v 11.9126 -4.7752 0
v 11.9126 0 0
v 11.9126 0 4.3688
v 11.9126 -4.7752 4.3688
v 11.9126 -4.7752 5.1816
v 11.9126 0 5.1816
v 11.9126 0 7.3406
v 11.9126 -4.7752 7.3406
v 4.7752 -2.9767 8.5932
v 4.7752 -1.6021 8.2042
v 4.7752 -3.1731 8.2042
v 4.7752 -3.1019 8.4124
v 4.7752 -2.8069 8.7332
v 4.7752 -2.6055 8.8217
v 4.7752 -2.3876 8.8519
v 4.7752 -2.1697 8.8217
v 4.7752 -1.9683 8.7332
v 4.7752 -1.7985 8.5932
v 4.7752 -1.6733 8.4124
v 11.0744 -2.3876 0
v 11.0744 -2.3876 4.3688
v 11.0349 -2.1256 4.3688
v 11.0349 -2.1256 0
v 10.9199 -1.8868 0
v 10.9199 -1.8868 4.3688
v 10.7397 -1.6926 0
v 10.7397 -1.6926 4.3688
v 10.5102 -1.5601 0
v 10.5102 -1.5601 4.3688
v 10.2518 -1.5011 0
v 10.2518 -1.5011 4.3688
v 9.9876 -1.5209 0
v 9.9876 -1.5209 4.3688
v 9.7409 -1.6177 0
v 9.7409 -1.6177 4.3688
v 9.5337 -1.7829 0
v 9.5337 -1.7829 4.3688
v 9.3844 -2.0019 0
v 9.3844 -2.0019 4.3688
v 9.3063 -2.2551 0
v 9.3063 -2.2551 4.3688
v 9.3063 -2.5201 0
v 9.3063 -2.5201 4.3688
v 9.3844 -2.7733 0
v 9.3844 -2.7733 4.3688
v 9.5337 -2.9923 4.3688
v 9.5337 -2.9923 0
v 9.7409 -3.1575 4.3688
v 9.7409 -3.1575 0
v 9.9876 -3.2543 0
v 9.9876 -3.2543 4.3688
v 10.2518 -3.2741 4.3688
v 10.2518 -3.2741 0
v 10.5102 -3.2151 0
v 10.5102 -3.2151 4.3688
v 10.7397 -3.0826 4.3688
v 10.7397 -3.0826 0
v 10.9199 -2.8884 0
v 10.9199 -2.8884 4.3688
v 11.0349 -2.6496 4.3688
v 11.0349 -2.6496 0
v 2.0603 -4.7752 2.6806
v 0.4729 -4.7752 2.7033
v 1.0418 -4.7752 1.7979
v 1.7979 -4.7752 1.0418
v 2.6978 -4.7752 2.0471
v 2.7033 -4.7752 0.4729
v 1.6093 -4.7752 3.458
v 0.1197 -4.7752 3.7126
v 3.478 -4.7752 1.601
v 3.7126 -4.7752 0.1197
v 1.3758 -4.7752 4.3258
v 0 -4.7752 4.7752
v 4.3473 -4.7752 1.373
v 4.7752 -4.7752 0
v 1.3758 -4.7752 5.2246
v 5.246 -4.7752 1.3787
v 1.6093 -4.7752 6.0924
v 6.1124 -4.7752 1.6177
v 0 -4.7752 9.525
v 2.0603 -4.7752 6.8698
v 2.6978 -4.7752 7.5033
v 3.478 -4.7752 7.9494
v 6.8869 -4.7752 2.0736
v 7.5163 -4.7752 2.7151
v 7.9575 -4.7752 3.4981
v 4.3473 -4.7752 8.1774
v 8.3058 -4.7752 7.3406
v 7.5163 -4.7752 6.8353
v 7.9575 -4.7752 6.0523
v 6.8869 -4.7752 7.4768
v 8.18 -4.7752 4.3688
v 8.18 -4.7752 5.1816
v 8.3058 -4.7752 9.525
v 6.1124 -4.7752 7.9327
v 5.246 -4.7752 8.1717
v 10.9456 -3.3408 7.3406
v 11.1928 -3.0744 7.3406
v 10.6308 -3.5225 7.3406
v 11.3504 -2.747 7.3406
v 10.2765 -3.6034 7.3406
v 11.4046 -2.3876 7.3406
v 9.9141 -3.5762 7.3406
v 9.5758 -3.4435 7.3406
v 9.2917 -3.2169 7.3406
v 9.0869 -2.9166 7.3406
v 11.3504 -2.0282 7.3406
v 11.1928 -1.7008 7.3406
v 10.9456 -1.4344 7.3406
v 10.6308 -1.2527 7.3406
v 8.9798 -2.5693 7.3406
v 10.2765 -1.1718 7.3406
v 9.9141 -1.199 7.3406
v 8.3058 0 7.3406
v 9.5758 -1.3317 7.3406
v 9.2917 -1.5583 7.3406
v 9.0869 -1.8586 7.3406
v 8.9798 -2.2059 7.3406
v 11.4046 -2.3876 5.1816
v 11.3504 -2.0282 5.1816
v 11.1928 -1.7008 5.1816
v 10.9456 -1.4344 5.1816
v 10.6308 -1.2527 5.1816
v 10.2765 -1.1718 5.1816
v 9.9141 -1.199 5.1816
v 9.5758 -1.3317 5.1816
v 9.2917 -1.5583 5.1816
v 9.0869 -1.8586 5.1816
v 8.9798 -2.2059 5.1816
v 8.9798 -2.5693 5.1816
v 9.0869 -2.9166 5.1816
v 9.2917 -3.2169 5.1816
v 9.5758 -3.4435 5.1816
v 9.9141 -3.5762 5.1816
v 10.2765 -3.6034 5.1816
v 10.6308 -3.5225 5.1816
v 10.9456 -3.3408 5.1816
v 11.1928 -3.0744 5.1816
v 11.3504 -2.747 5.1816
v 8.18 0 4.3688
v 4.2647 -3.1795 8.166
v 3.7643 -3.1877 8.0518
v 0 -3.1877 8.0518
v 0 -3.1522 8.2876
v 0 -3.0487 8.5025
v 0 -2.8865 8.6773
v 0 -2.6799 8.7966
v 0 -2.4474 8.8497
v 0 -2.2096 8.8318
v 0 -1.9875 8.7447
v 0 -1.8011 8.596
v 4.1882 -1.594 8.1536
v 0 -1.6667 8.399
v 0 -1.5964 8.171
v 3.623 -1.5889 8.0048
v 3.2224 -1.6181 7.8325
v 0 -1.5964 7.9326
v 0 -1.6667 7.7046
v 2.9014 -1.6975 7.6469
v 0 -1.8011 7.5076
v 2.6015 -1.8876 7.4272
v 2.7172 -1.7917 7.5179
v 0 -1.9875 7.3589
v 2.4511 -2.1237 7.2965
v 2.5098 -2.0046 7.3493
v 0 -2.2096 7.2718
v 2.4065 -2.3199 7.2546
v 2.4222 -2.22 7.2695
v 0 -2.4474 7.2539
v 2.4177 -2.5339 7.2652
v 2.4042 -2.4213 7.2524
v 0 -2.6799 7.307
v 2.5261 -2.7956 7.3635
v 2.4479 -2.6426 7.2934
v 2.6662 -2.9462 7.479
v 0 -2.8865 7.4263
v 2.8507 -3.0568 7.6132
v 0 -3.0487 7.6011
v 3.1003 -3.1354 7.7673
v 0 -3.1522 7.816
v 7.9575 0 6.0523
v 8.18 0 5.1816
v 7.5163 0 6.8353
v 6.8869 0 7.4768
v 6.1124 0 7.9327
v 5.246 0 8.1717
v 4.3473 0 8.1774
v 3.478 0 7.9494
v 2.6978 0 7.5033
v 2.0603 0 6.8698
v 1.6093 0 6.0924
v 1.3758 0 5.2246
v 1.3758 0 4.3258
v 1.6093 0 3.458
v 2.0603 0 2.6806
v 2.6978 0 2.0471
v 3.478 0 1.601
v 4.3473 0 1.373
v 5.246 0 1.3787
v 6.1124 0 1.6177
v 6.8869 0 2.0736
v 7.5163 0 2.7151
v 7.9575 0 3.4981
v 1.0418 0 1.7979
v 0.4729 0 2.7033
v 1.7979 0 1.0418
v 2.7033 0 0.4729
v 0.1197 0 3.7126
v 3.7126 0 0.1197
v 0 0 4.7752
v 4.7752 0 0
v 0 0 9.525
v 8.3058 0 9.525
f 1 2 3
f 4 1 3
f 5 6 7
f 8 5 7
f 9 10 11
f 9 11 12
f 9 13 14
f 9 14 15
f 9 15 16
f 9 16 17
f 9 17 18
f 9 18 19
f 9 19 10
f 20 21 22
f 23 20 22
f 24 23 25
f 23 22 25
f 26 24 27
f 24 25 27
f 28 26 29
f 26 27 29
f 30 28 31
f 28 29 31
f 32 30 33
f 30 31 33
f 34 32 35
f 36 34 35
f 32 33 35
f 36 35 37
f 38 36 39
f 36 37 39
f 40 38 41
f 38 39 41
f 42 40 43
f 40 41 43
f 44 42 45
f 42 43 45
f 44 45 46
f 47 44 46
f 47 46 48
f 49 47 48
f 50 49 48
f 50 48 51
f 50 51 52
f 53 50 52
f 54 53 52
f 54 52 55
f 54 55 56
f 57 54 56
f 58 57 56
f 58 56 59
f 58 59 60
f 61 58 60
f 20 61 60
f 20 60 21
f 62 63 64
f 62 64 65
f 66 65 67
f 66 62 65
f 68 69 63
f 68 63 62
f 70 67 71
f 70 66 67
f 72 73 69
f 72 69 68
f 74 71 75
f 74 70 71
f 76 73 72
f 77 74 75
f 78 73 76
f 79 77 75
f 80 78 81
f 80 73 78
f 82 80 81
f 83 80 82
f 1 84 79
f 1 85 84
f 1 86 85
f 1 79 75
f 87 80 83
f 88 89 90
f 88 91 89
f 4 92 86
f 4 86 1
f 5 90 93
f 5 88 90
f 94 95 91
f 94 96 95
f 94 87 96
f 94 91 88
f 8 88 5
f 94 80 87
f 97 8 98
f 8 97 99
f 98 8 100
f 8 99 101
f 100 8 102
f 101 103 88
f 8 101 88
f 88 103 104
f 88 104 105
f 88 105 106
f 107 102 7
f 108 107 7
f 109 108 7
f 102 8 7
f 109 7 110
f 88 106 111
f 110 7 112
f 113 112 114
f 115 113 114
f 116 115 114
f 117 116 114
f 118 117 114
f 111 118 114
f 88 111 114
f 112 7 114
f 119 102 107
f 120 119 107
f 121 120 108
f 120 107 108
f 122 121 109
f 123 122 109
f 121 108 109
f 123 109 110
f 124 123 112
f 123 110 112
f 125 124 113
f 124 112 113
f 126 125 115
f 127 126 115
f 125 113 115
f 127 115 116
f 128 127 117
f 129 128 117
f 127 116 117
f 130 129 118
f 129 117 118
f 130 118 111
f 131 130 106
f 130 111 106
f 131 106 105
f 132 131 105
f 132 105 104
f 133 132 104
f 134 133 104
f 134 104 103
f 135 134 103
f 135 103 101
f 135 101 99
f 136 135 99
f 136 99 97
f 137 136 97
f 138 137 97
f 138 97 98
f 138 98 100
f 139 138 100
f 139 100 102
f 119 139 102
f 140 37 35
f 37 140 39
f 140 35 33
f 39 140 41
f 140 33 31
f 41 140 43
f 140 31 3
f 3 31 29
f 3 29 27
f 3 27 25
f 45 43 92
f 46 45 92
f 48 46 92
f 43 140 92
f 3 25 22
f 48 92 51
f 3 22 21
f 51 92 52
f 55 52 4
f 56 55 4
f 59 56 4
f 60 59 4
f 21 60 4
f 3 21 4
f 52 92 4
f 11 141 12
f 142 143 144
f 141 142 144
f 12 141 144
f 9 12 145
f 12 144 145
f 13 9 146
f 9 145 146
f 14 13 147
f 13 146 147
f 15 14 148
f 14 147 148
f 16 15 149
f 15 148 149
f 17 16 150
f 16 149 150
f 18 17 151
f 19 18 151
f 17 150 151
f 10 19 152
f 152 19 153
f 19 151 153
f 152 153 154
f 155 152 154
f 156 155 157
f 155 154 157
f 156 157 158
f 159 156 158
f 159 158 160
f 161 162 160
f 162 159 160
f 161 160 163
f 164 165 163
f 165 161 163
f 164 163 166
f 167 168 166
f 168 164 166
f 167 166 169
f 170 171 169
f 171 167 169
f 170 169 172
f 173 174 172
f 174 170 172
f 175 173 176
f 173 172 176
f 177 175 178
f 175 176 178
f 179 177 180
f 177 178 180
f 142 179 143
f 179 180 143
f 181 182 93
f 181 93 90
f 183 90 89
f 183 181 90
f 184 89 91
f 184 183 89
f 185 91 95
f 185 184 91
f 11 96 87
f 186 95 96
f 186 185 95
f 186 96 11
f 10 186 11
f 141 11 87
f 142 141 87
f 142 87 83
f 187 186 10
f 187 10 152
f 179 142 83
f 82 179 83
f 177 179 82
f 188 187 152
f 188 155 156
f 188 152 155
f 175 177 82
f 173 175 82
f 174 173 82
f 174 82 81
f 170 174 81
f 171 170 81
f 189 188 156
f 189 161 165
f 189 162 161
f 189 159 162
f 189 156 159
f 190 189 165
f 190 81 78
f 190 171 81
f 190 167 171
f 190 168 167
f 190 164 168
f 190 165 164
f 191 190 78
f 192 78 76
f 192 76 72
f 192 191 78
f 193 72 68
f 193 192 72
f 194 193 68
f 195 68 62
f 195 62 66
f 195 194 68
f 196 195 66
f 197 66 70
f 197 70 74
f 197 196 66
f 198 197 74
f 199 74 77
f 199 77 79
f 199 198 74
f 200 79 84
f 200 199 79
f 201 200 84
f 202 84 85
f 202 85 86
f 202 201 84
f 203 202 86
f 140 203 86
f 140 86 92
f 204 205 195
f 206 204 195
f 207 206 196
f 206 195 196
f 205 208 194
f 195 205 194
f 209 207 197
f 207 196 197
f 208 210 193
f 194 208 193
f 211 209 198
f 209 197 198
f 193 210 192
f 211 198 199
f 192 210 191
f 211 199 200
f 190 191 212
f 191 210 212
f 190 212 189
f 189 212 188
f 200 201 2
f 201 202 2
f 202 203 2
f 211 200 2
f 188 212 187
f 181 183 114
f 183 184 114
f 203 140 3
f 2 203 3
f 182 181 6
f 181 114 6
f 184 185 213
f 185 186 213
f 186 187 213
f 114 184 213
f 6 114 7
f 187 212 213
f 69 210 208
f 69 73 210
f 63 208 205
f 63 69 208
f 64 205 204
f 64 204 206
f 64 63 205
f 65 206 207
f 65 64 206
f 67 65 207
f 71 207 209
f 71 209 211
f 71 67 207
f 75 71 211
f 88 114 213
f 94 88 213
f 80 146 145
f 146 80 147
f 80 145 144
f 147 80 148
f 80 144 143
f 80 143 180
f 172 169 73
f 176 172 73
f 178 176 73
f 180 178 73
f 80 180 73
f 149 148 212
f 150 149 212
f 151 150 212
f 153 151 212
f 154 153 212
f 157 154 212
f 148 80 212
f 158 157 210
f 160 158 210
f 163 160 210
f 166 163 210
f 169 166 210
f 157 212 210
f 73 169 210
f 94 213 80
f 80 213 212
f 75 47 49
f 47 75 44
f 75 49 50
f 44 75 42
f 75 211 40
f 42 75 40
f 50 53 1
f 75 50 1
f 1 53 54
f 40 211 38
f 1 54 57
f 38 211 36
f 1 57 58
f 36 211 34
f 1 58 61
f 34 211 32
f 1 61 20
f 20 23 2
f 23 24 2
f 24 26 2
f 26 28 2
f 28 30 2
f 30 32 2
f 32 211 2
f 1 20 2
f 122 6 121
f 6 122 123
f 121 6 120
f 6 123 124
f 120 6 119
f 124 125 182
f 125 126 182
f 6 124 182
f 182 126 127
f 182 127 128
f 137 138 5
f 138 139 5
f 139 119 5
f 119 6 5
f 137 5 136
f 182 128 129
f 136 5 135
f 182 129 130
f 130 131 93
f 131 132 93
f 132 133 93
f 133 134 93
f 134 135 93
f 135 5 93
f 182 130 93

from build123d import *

# Parameters (mm, degrees)
F0_R     = 3.429
F1_DEPTH = 4.7752
F3_DEPTH = 4.7762
F4_R     = 0.889
F5_DEPTH = 7.3416
F6_R     = 1.2192
F6_R_2   = 0.889
F7_DEPTH = 2.5908
F8_R     = 0.8001
F9_DEPTH = 4.7752
F10_R    = 4.7752


with BuildPart() as f1:
    # F0 (on Front) → F1 (new body)
    with BuildSketch(Plane.XZ):
        Polygon((0, 9.525), (0, 0), (11.9126, 0), (11.9126, 7.3406), (8.3058, 7.3406), (8.3058, 9.525), align=None)
        with Locations((4.7752, 4.7752)):
            Circle(F0_R, mode=Mode.SUBTRACT)
    extrude(amount=F1_DEPTH)

    # F2 (on face) → F3 (cut, through all)
    with BuildSketch(Plane.XZ.offset(4.7752)):
        with BuildLine():
            Line((11.9126, 5.1816), (8.1800318666, 5.1816))
            ThreePointArc((8.1800318666, 5.1816), (8.1981526341, 4.9787589955), (8.2042, 4.7752))
            ThreePointArc((8.2042, 4.7752), (8.1981526341, 4.5716410045), (8.1800318666, 4.3688))
            Line((8.1800318666, 4.3688), (11.9126, 4.3688))
            Line((11.9126, 4.3688), (11.9126, 5.1816))
        make_face()
    extrude(amount=-F3_DEPTH, mode=Mode.SUBTRACT)

    # F4 (on face) → F5 (cut, through all)
    with BuildSketch(Plane.XY.offset(7.3406)):
        with Locations((10.1854, -2.3876)):
            Circle(F4_R)
    extrude(amount=-F5_DEPTH, mode=Mode.SUBTRACT)

    # F6 (on face) → F7 (cut)
    with BuildSketch(Plane.XY.offset(7.3406)):
        with Locations((10.1854, -2.3876)):
            Circle(F6_R)
        with Locations((10.1854, -2.3876)):
            Circle(F6_R_2, mode=Mode.SUBTRACT)
    extrude(amount=-F7_DEPTH, mode=Mode.SUBTRACT)

    # F8 (on face) → F9 (cut)
    with BuildSketch(Plane(origin=(0, 0, 0), x_dir=(0, -1, 0), z_dir=(-1, 0, 0))):
        with Locations((2.3876, 8.0518)):
            Circle(F8_R)
    extrude(amount=-F9_DEPTH, mode=Mode.SUBTRACT)

    # F10
    f10_edges = [f1.edges().sort_by_distance(p)[0] for p in [
        (0, -2.3876, 0),
    ]]
    fillet(f10_edges, radius=F10_R)


solid = f1.part
